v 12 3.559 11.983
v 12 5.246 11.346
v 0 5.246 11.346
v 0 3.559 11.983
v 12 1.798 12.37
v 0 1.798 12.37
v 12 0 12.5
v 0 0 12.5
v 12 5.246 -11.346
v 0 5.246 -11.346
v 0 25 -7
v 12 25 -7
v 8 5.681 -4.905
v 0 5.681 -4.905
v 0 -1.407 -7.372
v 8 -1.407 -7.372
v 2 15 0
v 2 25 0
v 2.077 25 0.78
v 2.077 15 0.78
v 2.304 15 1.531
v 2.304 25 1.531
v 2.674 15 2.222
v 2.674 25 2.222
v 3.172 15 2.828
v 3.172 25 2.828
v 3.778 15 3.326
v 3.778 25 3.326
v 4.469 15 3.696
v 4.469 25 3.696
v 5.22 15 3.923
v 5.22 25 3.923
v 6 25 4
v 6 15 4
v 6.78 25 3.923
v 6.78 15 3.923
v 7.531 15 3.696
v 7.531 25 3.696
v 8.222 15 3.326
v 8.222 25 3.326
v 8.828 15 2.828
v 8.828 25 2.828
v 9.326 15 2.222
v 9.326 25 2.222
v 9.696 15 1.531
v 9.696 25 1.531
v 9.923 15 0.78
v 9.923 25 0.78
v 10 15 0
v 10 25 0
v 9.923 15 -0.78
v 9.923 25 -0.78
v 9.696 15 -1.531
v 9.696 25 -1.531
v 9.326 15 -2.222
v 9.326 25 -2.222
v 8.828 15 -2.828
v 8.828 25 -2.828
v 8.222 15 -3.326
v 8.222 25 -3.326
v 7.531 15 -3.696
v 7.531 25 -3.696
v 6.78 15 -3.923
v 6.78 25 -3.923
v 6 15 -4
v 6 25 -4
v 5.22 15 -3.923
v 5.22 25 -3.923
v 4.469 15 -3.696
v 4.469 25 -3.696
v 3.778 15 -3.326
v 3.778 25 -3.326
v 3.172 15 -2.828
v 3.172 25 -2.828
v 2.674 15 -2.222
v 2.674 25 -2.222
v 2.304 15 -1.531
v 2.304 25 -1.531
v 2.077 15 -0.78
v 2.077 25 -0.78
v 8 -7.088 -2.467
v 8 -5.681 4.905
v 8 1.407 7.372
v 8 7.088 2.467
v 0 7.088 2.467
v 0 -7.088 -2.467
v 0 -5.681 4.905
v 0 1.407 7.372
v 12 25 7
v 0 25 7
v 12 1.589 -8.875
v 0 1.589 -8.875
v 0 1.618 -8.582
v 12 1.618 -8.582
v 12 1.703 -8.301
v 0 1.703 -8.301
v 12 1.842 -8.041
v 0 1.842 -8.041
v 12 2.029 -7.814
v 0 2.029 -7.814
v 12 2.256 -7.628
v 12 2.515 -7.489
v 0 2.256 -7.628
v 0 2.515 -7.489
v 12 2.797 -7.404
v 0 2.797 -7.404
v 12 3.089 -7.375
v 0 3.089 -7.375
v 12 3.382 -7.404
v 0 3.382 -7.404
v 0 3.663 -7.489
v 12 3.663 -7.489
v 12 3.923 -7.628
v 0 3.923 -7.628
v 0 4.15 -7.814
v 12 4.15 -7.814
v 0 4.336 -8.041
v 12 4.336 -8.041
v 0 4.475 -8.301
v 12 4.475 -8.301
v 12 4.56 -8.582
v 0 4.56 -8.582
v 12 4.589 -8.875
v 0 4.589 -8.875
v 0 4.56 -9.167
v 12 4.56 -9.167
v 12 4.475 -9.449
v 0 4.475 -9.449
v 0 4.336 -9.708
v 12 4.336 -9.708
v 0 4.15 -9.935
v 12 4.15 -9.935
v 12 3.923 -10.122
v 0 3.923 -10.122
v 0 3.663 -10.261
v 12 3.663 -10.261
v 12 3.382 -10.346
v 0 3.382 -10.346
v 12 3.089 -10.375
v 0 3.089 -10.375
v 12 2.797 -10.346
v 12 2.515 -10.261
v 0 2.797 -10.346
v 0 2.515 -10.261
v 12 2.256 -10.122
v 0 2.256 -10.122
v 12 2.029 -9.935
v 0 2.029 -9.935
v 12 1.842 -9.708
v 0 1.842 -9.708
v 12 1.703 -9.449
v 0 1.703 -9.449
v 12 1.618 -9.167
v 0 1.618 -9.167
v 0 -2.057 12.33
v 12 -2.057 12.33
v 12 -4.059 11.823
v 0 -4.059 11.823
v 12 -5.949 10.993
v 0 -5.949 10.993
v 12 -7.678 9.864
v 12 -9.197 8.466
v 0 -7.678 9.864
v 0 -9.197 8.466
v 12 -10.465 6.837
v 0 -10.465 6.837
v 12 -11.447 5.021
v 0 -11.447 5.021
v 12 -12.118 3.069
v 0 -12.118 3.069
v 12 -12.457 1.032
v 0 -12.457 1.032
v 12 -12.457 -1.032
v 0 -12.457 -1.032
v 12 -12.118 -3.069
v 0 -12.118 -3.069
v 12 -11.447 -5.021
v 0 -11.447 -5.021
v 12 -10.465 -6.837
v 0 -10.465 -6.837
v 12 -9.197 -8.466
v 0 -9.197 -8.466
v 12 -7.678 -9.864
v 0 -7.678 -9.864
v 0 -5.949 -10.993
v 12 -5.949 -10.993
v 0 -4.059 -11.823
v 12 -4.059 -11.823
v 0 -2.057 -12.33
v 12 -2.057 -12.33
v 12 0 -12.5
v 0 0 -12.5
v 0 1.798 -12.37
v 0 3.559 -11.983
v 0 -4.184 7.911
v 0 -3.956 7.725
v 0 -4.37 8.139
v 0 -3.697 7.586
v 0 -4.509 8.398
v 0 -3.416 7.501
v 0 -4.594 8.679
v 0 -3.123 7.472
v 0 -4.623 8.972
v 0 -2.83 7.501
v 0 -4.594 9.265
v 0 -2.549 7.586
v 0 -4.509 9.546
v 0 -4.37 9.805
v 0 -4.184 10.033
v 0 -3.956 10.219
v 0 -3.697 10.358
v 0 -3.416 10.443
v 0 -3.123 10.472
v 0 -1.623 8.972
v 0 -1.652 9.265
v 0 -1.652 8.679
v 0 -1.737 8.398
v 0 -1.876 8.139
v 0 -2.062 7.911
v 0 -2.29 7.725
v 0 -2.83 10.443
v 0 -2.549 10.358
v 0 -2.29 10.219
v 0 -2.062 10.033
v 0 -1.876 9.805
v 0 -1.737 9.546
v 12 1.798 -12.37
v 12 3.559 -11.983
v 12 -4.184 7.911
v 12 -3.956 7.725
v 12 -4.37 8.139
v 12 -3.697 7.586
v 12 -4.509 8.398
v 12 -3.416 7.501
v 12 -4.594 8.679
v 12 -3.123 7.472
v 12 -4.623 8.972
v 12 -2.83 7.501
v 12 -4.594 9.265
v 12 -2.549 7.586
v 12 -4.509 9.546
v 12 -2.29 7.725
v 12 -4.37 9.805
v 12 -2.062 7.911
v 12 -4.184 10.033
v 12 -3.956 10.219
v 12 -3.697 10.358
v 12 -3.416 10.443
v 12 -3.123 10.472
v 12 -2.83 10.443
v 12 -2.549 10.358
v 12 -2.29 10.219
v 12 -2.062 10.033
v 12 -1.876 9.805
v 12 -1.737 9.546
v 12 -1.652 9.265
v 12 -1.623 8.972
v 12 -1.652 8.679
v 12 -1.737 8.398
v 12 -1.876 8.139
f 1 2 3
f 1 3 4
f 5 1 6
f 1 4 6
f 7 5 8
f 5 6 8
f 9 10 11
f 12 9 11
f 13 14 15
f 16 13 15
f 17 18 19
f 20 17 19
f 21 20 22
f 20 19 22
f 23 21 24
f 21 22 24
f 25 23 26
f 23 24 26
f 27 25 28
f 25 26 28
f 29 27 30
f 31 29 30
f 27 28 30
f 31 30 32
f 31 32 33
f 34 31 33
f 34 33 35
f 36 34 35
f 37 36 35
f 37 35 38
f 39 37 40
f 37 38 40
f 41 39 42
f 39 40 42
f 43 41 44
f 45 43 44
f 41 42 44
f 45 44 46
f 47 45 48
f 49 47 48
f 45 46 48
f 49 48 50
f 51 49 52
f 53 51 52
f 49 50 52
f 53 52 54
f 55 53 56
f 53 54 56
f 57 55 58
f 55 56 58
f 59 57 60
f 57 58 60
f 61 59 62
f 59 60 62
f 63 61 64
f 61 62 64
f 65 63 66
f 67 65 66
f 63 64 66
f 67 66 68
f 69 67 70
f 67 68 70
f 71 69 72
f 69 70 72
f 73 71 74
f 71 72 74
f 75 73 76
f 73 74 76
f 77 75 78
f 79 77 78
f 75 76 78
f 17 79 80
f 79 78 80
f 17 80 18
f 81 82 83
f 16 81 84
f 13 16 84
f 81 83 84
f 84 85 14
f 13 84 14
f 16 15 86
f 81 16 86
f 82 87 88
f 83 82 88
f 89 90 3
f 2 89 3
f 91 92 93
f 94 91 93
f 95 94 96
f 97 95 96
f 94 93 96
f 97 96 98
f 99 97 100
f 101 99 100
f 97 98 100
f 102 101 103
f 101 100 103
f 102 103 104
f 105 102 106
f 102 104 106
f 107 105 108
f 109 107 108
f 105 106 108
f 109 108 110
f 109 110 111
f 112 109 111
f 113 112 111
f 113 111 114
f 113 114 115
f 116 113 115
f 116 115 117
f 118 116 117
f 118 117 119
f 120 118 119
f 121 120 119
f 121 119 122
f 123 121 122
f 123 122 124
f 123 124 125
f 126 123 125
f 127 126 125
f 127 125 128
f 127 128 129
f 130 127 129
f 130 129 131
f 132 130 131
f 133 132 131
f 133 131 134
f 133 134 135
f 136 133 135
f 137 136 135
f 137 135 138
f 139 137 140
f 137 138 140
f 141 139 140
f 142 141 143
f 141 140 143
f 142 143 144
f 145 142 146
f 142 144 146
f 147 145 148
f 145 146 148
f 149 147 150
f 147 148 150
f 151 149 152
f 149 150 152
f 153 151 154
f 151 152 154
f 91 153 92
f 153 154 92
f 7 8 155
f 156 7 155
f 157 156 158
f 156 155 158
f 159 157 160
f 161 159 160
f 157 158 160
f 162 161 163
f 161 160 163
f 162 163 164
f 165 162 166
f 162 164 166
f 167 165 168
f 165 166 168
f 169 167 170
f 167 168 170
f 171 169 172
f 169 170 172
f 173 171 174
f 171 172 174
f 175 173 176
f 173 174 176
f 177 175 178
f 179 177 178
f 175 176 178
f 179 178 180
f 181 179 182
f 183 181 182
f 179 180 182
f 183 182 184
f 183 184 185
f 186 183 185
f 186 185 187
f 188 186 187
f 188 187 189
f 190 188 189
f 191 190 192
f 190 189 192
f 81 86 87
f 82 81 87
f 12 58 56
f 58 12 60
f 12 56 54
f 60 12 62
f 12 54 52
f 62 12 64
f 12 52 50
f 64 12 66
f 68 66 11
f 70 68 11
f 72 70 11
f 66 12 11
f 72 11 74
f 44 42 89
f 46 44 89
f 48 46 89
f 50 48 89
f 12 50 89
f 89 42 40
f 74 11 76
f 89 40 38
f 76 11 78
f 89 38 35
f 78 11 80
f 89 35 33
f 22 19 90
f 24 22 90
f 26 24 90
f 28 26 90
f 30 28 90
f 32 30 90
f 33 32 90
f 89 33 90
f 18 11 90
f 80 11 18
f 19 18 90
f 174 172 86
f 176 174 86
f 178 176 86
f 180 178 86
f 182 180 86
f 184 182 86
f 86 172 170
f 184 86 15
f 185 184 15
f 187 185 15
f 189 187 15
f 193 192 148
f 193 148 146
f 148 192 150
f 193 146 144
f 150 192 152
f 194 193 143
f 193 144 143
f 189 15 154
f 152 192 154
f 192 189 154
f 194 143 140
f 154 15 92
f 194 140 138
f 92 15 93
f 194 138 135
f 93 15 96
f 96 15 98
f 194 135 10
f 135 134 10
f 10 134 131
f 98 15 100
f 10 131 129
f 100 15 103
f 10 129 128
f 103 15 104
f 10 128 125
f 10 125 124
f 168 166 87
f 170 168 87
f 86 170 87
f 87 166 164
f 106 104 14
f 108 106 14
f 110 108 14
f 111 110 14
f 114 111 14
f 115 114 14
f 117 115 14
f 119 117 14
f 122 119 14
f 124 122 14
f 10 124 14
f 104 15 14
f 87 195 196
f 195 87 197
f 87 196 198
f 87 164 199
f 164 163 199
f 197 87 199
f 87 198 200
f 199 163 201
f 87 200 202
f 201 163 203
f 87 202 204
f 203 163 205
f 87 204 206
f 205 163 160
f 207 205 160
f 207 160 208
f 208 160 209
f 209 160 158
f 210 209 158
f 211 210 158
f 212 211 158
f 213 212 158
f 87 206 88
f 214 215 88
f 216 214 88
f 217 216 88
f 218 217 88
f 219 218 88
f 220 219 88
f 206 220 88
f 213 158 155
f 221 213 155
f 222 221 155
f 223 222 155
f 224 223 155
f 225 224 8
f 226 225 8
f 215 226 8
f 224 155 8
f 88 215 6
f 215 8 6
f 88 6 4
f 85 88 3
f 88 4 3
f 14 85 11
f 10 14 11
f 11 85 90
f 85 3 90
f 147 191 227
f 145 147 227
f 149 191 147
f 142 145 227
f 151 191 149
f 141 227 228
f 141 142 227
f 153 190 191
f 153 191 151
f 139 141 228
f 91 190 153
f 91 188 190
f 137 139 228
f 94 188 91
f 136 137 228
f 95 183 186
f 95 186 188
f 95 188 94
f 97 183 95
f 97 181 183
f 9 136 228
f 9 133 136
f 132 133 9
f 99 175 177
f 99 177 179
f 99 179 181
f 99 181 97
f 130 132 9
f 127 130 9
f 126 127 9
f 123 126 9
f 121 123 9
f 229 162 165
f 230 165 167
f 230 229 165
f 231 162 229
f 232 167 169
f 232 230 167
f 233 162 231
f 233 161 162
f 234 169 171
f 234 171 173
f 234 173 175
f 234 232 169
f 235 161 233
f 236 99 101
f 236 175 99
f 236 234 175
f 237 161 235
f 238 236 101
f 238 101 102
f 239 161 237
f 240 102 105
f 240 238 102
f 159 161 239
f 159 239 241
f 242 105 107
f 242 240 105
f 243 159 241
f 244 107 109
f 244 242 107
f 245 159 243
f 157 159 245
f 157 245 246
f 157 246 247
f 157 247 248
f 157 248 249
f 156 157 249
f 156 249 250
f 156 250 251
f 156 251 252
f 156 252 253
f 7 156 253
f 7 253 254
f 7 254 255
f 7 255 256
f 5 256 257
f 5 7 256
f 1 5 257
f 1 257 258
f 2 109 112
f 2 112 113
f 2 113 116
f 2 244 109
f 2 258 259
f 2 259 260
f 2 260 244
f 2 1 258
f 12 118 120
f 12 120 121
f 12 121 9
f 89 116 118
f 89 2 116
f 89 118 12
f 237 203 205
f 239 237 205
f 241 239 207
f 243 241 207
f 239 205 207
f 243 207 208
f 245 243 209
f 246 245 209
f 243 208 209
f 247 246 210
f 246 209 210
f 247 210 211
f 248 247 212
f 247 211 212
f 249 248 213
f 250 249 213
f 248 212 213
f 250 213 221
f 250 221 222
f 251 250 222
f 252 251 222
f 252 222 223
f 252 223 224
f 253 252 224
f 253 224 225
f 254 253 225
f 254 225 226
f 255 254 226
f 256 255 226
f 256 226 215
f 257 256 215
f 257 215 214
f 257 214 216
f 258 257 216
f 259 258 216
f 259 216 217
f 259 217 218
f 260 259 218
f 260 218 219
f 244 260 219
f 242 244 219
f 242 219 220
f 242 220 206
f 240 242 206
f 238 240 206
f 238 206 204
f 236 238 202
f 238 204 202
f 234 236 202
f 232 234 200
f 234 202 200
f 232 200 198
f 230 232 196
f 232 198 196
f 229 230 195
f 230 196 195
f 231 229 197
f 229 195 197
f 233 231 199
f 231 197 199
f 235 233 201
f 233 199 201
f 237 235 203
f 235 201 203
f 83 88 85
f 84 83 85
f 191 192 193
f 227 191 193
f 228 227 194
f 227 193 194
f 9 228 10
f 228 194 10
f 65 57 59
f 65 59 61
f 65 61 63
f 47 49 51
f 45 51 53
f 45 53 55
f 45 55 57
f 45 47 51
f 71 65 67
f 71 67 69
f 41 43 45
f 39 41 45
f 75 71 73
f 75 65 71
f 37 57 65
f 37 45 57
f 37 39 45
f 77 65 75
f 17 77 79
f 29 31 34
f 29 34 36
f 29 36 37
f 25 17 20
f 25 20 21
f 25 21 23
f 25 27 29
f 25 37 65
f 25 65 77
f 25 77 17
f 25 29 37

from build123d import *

# Parameters (mm, degrees)
F1_DEPTH = 12
F2_R     = 4
F3_DEPTH = 10
F4_R     = 7.55
F5_DEPTH = 4
F6_R     = 1.5
F7_DEPTH = 25


with BuildPart() as f1:
    # F0 (on Right) → F1 (new body)
    with BuildSketch(Plane.YZ):
        with BuildLine():
            Line((5.246089, 11.34586), (0, 12.5))
            ThreePointArc((0, 12.5), (-12.5, 0), (0, -12.5))
            Line((0, -12.5), (5.246089, -11.34586))
            ThreePointArc((5.246089, -11.34586), (10.531527, -6.733271), (12.5, 0))
            ThreePointArc((12.5, 0), (10.531527, 6.733271), (5.246089, 11.34586))
        make_face()
        Polygon((7.088382, 2.467421), (5.681041, -4.905009), (-1.407342, -7.37243), (-7.088382, -2.467421), (-5.681041, 4.905009), (1.407342, 7.37243), align=None, mode=Mode.SUBTRACT)
        with BuildLine():
            ThreePointArc((5.246089, 11.34586), (2.685772, 12.208056), (0, 12.5))
            Line((0, 12.5), (5.246089, 11.34586))
        make_face()
        with BuildLine():
            Line((5.246089, -11.34586), (0, -12.5))
            ThreePointArc((0, -12.5), (2.685772, -12.208056), (5.246089, -11.34586))
        make_face()
        with BuildLine():
            Line((25, 7), (5.246089, 11.34586))
            ThreePointArc((5.246089, 11.34586), (10.531527, 6.733271), (12.5, 0))
            ThreePointArc((12.5, 0), (10.531527, -6.733271), (5.246089, -11.34586))
            Line((5.246089, -11.34586), (25, -7))
            Line((25, -7), (25, 0))
            Line((25, 0), (25, 7))
        make_face()
    extrude(amount=F1_DEPTH)

    # F2 (on face) → F3 (cut)
    with BuildSketch(Plane(origin=(0, 25, 0), x_dir=(-1, 0, 0), z_dir=(0, 1, 0))):
        with Locations((-6, 0)):
            Circle(F2_R)
    extrude(amount=-F3_DEPTH, mode=Mode.SUBTRACT)

    # F4 (on face) → F5 (join)
    with BuildSketch(Plane.YZ.offset(12)):
        Circle(F4_R)
    extrude(amount=-F5_DEPTH)

    # F6 (on face) → F7 (cut)
    with BuildSketch(Plane(origin=(0, 0, 0), x_dir=(0, -1, 0), z_dir=(-1, 0, 0))):
        with Locations((3.123088, 8.971974)):
            Circle(F6_R)
        with Locations((-3.089254, -8.874777)):
            Circle(F6_R)
    extrude(amount=-F7_DEPTH, mode=Mode.SUBTRACT)


solid = f1.part
